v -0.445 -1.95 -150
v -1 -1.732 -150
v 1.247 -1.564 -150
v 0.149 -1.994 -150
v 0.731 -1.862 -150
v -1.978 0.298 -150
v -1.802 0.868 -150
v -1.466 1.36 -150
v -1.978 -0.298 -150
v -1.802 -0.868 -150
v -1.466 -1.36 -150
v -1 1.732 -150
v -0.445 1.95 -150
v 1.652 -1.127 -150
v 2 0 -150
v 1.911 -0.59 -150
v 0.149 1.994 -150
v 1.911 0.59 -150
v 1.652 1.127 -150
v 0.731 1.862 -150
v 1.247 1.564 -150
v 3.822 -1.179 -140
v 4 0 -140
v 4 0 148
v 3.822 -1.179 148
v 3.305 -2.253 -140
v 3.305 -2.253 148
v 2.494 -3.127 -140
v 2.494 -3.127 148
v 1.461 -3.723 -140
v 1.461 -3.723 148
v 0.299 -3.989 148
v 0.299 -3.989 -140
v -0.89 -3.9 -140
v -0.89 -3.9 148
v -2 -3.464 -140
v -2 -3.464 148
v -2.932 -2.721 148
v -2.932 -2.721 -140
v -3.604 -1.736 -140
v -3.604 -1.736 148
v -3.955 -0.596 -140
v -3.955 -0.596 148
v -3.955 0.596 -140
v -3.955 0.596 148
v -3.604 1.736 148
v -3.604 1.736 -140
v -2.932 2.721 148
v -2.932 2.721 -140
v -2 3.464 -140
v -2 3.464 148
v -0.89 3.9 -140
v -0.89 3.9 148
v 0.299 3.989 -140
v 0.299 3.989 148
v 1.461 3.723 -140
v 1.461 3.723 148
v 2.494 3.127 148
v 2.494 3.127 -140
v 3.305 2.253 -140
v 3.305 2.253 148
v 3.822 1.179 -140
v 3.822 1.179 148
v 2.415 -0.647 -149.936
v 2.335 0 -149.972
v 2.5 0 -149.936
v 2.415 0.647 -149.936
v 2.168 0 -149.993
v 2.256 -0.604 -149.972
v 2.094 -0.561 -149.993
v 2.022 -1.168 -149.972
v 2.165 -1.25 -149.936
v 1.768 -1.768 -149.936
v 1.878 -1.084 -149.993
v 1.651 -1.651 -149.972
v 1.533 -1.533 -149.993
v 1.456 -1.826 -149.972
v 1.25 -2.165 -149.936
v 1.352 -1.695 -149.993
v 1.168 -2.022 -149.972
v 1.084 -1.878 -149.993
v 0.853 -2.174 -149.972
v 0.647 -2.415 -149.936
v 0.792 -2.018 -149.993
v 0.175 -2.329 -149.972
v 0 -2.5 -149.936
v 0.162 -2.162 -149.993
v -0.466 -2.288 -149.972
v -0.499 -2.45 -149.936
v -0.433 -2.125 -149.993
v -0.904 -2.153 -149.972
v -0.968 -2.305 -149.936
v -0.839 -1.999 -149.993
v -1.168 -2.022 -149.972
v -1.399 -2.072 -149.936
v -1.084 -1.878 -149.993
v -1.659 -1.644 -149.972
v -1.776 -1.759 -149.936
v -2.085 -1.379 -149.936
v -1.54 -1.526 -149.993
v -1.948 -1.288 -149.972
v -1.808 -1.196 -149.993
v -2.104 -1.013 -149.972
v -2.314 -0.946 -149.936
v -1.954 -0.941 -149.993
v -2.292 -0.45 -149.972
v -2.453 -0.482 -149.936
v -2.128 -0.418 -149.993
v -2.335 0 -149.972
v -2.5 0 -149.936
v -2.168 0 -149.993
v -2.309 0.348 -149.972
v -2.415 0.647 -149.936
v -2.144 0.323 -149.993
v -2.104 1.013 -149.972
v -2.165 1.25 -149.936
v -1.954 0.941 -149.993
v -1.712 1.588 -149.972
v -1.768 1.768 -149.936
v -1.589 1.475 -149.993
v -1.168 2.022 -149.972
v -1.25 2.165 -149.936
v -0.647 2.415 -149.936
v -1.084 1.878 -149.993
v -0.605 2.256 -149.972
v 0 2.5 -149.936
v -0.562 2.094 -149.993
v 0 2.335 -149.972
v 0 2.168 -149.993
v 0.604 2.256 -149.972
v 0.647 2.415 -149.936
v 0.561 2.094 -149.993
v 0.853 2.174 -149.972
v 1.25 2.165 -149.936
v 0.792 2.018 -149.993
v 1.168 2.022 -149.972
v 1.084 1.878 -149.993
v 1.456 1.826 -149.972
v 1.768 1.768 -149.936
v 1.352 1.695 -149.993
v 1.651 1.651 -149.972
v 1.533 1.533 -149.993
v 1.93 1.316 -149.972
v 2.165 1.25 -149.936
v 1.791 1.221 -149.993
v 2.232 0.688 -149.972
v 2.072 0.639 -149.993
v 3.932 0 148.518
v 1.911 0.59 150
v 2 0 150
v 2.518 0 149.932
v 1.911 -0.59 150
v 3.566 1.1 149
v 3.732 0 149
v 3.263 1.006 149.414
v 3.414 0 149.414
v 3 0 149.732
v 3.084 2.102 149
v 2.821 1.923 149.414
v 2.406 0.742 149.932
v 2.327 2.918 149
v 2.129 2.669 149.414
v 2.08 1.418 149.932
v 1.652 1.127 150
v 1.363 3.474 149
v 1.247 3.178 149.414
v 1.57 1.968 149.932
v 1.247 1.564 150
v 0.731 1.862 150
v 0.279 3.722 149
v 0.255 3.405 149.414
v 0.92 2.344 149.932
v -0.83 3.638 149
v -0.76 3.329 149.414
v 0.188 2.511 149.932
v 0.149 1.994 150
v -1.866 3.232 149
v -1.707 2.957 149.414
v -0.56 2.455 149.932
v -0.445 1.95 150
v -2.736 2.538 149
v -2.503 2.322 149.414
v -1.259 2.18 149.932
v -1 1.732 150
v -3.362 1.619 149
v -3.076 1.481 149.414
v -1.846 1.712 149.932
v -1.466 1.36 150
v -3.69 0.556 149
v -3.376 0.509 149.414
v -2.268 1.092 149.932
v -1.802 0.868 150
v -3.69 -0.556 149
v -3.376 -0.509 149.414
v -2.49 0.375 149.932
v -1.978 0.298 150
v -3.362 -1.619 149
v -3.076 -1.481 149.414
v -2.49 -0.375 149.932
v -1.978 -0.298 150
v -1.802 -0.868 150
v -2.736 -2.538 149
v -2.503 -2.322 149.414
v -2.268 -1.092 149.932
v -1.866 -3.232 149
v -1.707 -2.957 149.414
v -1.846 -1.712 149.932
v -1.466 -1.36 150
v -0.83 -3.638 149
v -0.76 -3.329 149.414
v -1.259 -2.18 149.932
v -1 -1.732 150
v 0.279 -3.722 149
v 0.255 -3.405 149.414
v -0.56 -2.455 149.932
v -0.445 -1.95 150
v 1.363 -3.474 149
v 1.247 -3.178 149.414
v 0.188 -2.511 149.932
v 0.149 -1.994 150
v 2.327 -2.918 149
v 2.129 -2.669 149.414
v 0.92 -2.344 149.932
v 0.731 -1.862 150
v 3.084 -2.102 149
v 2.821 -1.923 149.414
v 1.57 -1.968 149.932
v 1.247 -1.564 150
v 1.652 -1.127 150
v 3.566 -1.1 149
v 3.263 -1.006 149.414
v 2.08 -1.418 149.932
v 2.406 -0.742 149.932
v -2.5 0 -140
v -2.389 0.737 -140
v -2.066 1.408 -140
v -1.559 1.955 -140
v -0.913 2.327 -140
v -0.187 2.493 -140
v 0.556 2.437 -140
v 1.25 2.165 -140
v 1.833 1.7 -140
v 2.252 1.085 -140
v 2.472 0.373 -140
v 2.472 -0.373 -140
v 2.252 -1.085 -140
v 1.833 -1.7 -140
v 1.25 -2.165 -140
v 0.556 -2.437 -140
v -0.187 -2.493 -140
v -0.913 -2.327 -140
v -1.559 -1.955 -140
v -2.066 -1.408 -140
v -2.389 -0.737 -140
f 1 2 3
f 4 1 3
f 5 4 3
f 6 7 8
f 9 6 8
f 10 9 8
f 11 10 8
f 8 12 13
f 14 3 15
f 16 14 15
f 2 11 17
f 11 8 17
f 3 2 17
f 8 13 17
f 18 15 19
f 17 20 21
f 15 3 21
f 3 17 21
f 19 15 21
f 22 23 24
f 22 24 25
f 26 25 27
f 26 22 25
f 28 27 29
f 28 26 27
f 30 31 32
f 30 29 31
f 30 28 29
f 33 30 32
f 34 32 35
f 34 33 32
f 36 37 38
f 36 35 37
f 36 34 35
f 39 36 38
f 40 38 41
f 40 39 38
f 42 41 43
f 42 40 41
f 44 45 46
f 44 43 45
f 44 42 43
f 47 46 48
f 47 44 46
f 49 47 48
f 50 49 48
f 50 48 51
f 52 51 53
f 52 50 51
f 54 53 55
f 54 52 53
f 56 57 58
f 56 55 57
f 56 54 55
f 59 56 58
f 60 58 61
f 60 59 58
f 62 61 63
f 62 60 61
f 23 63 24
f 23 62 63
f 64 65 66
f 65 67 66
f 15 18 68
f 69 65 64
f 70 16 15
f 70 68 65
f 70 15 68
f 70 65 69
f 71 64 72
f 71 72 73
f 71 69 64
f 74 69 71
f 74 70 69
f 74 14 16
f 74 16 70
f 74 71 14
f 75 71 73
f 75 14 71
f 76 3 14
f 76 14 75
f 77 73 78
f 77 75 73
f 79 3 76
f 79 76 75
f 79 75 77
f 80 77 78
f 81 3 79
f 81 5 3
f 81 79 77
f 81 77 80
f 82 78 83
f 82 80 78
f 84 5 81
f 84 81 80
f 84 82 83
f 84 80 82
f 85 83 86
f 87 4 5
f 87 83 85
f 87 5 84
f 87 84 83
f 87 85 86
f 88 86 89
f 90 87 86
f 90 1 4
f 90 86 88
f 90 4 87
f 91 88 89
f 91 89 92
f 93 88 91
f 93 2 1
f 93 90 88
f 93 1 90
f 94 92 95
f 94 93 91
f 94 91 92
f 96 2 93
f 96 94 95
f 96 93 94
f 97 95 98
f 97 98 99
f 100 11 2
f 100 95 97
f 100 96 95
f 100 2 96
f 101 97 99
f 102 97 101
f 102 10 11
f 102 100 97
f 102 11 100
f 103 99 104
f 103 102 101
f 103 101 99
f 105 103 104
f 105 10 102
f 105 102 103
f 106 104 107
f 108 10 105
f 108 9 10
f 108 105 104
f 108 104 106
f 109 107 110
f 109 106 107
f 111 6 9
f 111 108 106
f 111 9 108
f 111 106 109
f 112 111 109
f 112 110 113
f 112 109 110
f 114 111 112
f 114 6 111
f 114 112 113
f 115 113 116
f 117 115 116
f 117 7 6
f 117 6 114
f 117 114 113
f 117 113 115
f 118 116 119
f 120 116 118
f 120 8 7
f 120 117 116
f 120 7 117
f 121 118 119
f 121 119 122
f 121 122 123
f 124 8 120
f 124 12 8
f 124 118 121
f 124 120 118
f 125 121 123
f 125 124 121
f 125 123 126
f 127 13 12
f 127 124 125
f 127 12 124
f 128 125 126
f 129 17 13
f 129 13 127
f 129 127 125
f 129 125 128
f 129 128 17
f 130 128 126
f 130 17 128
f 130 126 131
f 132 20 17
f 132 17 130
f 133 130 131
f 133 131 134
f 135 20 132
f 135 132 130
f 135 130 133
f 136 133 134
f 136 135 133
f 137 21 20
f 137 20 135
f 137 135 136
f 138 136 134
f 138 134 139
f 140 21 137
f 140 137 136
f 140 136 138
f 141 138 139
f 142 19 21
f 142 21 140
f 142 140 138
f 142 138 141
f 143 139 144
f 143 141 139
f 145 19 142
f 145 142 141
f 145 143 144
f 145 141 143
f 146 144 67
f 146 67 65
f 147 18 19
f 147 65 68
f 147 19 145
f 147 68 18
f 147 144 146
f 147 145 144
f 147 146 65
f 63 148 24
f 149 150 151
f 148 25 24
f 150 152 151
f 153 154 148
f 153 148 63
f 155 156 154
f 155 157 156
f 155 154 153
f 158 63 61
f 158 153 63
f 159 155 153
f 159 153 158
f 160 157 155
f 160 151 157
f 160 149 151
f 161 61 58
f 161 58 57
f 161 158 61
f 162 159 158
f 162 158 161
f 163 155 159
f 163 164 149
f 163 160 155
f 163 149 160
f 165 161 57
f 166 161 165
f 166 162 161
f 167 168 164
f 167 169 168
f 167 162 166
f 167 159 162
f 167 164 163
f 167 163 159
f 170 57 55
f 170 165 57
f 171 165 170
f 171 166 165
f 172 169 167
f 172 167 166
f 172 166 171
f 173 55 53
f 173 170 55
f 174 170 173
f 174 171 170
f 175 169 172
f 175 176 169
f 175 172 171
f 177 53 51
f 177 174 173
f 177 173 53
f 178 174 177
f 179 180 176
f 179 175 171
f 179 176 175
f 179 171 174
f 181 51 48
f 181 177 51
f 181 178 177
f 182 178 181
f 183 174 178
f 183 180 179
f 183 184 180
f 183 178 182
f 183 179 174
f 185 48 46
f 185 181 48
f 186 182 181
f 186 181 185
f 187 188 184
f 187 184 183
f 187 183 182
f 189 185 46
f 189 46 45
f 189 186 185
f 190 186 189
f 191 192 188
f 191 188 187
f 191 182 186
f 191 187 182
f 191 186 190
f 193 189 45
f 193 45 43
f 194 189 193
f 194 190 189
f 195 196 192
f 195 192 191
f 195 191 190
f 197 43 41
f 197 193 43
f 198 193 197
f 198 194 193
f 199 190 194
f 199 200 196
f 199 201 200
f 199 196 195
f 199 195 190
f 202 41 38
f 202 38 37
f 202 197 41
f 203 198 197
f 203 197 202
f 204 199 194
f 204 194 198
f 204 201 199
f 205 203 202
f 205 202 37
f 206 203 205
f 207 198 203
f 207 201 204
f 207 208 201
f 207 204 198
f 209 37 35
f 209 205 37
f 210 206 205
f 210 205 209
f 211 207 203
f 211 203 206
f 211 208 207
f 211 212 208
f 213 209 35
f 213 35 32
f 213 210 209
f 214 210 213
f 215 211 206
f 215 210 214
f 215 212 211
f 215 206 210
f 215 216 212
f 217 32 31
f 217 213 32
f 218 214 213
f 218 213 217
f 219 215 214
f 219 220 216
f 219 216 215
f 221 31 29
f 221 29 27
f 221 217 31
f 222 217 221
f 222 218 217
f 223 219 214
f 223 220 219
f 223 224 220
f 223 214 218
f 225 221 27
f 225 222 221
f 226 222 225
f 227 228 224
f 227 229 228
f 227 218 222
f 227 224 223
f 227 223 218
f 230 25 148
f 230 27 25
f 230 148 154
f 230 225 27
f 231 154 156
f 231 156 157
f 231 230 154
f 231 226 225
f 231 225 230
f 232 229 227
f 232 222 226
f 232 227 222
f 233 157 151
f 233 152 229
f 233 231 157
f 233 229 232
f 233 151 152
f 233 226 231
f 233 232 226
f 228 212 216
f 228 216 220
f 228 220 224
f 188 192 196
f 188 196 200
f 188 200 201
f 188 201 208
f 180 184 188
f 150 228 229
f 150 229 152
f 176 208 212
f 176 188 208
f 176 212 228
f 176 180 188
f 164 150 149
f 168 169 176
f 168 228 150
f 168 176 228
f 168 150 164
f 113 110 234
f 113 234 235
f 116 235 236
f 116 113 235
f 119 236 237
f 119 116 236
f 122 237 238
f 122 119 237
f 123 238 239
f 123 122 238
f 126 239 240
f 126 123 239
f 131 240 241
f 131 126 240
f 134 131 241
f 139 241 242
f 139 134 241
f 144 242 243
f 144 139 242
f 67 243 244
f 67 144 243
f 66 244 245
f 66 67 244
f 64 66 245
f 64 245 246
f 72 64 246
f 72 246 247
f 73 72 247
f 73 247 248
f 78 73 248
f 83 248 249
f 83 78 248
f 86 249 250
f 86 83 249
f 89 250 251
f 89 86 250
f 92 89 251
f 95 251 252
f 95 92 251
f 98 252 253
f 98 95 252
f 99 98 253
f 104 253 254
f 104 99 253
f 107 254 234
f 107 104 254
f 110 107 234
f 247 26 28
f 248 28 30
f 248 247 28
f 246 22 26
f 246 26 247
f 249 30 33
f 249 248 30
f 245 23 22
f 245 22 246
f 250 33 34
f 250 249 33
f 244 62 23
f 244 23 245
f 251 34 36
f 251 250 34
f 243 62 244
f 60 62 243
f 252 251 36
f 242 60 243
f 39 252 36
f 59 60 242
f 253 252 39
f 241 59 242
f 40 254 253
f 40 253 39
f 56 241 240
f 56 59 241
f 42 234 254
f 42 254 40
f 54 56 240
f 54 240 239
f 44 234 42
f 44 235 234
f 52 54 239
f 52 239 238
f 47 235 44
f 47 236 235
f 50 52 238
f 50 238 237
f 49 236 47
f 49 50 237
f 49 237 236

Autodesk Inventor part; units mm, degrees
ref_plane "YZ Plane" through (0, 0, 0) normal (1, 0, 0) x (0, 1, 0)
ref_plane "XZ Plane" through (0, 0, 0) normal (0, 1, 0) x (-1, 0, 0)
ref_plane "XY Plane" through (0, 0, 0) normal (0, 0, 1) x (1, 0, 0)
sketch "Sketch1" plane through (0, 0, 0) normal (0, 0, 1) x (1, 0, 0)
  circle A0 centre (0, 0) radius 4
  dimension "d0" = 8
extrude "Extrusion1" add sketch "Sketch1" along normal mid plane 300
fillet "Fillet1" radius 2 2 edges at (-4, 0, 150) (-4, 0, -150)
thread "Thread1" size "M8x1.25" class "6g" standard "ANSI Metric M Profile" full length
sketch "Sketch2" plane through (0, 0, -150) normal (0, 0, -1) x (-1, 0, 0)
  circle A0 centre (0, 0) radius 2 construction
  circle A1 centre (0, 0) radius 4.5
  circle A2 centre (0, 0) radius 4 construction
  circle A3 centre (0, 0) radius 2.5
  dimension "d6" = 0.5
  dimension "d7" = 5
extrude "Extrusion2" cut sketch "Sketch2" against normal blind 10
properties part number "Z Akse gevindstang" material "Aluminum 6061"
